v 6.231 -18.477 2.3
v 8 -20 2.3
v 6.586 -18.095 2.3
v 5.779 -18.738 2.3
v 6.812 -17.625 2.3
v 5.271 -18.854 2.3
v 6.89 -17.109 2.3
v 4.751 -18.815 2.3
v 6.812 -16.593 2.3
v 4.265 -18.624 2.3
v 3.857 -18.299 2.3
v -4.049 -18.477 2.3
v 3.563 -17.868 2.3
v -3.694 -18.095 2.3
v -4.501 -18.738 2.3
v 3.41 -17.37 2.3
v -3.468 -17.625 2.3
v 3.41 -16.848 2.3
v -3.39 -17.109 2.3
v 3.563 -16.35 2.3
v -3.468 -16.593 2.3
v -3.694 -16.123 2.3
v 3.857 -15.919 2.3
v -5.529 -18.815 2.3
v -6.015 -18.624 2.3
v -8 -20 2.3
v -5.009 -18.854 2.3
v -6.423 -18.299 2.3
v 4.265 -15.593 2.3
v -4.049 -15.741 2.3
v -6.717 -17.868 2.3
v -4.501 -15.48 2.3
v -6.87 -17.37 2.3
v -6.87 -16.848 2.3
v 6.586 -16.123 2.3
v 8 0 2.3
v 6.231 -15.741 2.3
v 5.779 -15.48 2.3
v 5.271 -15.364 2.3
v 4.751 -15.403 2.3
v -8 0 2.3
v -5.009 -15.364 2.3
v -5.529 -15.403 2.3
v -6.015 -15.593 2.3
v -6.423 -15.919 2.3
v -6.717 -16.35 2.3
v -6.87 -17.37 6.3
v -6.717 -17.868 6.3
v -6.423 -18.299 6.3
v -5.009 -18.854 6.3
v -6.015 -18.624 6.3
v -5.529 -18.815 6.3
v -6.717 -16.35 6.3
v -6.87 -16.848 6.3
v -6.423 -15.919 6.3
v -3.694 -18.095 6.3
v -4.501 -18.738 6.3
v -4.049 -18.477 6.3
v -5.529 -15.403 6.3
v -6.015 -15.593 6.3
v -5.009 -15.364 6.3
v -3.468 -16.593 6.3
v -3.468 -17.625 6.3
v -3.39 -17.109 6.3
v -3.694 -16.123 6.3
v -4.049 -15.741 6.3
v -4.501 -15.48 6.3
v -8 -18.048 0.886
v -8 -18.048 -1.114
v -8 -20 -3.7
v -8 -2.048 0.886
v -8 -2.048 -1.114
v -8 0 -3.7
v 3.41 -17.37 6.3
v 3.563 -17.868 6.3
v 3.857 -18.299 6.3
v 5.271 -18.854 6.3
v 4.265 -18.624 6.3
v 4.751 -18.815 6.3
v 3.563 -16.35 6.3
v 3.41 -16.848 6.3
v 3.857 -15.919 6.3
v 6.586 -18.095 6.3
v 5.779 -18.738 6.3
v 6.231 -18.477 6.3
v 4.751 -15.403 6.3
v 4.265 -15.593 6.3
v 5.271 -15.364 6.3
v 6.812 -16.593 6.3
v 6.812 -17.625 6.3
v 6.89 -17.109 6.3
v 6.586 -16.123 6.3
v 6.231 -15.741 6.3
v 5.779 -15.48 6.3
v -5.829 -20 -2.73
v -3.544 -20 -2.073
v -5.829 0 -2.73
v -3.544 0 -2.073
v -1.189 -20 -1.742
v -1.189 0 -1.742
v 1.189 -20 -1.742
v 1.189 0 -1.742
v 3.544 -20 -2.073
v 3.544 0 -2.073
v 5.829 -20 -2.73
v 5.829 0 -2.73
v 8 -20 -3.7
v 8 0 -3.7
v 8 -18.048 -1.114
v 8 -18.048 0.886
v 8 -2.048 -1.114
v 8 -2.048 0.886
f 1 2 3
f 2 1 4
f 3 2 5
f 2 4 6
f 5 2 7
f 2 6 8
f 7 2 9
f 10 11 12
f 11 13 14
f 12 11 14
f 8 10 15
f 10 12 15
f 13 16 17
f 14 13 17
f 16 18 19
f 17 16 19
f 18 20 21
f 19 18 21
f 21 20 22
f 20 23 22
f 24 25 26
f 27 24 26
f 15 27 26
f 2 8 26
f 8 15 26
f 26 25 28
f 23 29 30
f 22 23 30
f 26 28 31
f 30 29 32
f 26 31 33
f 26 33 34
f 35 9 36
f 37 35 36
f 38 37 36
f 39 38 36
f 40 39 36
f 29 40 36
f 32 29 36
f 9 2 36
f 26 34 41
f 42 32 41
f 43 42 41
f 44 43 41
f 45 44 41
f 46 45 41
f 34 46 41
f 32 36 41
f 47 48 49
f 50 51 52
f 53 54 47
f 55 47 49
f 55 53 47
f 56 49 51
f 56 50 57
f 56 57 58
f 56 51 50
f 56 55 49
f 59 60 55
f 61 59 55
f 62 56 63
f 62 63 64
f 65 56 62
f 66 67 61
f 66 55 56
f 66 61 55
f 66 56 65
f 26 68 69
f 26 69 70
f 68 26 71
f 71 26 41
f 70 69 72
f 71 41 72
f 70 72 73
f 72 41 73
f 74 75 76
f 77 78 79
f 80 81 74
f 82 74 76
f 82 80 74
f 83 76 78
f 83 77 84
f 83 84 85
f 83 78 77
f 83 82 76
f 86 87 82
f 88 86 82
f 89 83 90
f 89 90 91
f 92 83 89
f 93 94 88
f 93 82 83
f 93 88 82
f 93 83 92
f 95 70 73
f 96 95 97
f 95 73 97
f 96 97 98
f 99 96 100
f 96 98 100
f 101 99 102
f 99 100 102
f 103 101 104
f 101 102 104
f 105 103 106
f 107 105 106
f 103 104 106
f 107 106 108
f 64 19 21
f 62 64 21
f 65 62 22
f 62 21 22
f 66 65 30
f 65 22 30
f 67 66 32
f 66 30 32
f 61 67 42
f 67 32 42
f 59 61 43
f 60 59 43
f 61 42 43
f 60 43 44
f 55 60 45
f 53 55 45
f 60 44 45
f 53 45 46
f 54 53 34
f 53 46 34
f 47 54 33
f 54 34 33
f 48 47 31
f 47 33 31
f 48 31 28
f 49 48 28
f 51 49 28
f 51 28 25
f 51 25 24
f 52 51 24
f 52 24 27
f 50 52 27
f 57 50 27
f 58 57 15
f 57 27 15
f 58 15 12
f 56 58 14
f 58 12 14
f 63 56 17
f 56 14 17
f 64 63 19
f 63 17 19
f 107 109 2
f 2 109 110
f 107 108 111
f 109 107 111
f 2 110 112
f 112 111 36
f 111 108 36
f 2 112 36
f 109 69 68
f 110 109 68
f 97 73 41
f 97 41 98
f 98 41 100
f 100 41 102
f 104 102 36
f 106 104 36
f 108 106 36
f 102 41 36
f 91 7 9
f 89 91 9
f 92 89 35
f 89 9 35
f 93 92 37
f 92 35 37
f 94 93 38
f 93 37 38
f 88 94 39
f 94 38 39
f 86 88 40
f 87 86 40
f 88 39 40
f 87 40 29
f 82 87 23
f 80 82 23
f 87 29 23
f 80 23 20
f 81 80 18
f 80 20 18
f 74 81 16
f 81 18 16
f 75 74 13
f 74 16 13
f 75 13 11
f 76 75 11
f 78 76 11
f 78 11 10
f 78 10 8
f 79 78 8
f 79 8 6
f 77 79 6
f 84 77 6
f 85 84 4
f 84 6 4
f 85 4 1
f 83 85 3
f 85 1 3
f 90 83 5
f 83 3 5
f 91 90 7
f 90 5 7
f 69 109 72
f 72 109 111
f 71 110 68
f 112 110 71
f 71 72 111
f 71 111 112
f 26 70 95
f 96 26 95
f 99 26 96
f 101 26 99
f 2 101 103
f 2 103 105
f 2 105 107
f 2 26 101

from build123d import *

# Parameters (mm, degrees)
F1_DEPTH = 20
F2_W     = 16
F2_H     = 2
F3_DEPTH = 16
F4_R     = 1.75
F5_DEPTH = 4


with BuildPart() as f1:
    # F0 (on Front) → F1 (new body)
    with BuildSketch(Plane.XZ):
        with BuildLine():
            ThreePointArc((-8, -3.7), (0, -1.7), (8, -3.7))
            Line((8, -3.7), (8, 2.3))
            Line((8, 2.3), (-8, 2.3))
            Line((-8, 2.3), (-8, -3.7))
        make_face()
    extrude(amount=F1_DEPTH)

    # F2 (on face) → F3 (cut, through all)
    with BuildSketch(Plane.YZ.offset(8)):
        with Locations((-10.047581, -0.113725)):
            Rectangle(F2_W, F2_H)
    extrude(amount=-F3_DEPTH, mode=Mode.SUBTRACT)

    # F4 (on face) → F5 (join)
    with BuildSketch(Plane.XY.offset(2.3)):
        with Locations((-5.14, -17.108951)):
            Circle(F4_R)
        with Locations((5.14, -17.108951)):
            Circle(F4_R)
    extrude(amount=F5_DEPTH)


solid = f1.part
